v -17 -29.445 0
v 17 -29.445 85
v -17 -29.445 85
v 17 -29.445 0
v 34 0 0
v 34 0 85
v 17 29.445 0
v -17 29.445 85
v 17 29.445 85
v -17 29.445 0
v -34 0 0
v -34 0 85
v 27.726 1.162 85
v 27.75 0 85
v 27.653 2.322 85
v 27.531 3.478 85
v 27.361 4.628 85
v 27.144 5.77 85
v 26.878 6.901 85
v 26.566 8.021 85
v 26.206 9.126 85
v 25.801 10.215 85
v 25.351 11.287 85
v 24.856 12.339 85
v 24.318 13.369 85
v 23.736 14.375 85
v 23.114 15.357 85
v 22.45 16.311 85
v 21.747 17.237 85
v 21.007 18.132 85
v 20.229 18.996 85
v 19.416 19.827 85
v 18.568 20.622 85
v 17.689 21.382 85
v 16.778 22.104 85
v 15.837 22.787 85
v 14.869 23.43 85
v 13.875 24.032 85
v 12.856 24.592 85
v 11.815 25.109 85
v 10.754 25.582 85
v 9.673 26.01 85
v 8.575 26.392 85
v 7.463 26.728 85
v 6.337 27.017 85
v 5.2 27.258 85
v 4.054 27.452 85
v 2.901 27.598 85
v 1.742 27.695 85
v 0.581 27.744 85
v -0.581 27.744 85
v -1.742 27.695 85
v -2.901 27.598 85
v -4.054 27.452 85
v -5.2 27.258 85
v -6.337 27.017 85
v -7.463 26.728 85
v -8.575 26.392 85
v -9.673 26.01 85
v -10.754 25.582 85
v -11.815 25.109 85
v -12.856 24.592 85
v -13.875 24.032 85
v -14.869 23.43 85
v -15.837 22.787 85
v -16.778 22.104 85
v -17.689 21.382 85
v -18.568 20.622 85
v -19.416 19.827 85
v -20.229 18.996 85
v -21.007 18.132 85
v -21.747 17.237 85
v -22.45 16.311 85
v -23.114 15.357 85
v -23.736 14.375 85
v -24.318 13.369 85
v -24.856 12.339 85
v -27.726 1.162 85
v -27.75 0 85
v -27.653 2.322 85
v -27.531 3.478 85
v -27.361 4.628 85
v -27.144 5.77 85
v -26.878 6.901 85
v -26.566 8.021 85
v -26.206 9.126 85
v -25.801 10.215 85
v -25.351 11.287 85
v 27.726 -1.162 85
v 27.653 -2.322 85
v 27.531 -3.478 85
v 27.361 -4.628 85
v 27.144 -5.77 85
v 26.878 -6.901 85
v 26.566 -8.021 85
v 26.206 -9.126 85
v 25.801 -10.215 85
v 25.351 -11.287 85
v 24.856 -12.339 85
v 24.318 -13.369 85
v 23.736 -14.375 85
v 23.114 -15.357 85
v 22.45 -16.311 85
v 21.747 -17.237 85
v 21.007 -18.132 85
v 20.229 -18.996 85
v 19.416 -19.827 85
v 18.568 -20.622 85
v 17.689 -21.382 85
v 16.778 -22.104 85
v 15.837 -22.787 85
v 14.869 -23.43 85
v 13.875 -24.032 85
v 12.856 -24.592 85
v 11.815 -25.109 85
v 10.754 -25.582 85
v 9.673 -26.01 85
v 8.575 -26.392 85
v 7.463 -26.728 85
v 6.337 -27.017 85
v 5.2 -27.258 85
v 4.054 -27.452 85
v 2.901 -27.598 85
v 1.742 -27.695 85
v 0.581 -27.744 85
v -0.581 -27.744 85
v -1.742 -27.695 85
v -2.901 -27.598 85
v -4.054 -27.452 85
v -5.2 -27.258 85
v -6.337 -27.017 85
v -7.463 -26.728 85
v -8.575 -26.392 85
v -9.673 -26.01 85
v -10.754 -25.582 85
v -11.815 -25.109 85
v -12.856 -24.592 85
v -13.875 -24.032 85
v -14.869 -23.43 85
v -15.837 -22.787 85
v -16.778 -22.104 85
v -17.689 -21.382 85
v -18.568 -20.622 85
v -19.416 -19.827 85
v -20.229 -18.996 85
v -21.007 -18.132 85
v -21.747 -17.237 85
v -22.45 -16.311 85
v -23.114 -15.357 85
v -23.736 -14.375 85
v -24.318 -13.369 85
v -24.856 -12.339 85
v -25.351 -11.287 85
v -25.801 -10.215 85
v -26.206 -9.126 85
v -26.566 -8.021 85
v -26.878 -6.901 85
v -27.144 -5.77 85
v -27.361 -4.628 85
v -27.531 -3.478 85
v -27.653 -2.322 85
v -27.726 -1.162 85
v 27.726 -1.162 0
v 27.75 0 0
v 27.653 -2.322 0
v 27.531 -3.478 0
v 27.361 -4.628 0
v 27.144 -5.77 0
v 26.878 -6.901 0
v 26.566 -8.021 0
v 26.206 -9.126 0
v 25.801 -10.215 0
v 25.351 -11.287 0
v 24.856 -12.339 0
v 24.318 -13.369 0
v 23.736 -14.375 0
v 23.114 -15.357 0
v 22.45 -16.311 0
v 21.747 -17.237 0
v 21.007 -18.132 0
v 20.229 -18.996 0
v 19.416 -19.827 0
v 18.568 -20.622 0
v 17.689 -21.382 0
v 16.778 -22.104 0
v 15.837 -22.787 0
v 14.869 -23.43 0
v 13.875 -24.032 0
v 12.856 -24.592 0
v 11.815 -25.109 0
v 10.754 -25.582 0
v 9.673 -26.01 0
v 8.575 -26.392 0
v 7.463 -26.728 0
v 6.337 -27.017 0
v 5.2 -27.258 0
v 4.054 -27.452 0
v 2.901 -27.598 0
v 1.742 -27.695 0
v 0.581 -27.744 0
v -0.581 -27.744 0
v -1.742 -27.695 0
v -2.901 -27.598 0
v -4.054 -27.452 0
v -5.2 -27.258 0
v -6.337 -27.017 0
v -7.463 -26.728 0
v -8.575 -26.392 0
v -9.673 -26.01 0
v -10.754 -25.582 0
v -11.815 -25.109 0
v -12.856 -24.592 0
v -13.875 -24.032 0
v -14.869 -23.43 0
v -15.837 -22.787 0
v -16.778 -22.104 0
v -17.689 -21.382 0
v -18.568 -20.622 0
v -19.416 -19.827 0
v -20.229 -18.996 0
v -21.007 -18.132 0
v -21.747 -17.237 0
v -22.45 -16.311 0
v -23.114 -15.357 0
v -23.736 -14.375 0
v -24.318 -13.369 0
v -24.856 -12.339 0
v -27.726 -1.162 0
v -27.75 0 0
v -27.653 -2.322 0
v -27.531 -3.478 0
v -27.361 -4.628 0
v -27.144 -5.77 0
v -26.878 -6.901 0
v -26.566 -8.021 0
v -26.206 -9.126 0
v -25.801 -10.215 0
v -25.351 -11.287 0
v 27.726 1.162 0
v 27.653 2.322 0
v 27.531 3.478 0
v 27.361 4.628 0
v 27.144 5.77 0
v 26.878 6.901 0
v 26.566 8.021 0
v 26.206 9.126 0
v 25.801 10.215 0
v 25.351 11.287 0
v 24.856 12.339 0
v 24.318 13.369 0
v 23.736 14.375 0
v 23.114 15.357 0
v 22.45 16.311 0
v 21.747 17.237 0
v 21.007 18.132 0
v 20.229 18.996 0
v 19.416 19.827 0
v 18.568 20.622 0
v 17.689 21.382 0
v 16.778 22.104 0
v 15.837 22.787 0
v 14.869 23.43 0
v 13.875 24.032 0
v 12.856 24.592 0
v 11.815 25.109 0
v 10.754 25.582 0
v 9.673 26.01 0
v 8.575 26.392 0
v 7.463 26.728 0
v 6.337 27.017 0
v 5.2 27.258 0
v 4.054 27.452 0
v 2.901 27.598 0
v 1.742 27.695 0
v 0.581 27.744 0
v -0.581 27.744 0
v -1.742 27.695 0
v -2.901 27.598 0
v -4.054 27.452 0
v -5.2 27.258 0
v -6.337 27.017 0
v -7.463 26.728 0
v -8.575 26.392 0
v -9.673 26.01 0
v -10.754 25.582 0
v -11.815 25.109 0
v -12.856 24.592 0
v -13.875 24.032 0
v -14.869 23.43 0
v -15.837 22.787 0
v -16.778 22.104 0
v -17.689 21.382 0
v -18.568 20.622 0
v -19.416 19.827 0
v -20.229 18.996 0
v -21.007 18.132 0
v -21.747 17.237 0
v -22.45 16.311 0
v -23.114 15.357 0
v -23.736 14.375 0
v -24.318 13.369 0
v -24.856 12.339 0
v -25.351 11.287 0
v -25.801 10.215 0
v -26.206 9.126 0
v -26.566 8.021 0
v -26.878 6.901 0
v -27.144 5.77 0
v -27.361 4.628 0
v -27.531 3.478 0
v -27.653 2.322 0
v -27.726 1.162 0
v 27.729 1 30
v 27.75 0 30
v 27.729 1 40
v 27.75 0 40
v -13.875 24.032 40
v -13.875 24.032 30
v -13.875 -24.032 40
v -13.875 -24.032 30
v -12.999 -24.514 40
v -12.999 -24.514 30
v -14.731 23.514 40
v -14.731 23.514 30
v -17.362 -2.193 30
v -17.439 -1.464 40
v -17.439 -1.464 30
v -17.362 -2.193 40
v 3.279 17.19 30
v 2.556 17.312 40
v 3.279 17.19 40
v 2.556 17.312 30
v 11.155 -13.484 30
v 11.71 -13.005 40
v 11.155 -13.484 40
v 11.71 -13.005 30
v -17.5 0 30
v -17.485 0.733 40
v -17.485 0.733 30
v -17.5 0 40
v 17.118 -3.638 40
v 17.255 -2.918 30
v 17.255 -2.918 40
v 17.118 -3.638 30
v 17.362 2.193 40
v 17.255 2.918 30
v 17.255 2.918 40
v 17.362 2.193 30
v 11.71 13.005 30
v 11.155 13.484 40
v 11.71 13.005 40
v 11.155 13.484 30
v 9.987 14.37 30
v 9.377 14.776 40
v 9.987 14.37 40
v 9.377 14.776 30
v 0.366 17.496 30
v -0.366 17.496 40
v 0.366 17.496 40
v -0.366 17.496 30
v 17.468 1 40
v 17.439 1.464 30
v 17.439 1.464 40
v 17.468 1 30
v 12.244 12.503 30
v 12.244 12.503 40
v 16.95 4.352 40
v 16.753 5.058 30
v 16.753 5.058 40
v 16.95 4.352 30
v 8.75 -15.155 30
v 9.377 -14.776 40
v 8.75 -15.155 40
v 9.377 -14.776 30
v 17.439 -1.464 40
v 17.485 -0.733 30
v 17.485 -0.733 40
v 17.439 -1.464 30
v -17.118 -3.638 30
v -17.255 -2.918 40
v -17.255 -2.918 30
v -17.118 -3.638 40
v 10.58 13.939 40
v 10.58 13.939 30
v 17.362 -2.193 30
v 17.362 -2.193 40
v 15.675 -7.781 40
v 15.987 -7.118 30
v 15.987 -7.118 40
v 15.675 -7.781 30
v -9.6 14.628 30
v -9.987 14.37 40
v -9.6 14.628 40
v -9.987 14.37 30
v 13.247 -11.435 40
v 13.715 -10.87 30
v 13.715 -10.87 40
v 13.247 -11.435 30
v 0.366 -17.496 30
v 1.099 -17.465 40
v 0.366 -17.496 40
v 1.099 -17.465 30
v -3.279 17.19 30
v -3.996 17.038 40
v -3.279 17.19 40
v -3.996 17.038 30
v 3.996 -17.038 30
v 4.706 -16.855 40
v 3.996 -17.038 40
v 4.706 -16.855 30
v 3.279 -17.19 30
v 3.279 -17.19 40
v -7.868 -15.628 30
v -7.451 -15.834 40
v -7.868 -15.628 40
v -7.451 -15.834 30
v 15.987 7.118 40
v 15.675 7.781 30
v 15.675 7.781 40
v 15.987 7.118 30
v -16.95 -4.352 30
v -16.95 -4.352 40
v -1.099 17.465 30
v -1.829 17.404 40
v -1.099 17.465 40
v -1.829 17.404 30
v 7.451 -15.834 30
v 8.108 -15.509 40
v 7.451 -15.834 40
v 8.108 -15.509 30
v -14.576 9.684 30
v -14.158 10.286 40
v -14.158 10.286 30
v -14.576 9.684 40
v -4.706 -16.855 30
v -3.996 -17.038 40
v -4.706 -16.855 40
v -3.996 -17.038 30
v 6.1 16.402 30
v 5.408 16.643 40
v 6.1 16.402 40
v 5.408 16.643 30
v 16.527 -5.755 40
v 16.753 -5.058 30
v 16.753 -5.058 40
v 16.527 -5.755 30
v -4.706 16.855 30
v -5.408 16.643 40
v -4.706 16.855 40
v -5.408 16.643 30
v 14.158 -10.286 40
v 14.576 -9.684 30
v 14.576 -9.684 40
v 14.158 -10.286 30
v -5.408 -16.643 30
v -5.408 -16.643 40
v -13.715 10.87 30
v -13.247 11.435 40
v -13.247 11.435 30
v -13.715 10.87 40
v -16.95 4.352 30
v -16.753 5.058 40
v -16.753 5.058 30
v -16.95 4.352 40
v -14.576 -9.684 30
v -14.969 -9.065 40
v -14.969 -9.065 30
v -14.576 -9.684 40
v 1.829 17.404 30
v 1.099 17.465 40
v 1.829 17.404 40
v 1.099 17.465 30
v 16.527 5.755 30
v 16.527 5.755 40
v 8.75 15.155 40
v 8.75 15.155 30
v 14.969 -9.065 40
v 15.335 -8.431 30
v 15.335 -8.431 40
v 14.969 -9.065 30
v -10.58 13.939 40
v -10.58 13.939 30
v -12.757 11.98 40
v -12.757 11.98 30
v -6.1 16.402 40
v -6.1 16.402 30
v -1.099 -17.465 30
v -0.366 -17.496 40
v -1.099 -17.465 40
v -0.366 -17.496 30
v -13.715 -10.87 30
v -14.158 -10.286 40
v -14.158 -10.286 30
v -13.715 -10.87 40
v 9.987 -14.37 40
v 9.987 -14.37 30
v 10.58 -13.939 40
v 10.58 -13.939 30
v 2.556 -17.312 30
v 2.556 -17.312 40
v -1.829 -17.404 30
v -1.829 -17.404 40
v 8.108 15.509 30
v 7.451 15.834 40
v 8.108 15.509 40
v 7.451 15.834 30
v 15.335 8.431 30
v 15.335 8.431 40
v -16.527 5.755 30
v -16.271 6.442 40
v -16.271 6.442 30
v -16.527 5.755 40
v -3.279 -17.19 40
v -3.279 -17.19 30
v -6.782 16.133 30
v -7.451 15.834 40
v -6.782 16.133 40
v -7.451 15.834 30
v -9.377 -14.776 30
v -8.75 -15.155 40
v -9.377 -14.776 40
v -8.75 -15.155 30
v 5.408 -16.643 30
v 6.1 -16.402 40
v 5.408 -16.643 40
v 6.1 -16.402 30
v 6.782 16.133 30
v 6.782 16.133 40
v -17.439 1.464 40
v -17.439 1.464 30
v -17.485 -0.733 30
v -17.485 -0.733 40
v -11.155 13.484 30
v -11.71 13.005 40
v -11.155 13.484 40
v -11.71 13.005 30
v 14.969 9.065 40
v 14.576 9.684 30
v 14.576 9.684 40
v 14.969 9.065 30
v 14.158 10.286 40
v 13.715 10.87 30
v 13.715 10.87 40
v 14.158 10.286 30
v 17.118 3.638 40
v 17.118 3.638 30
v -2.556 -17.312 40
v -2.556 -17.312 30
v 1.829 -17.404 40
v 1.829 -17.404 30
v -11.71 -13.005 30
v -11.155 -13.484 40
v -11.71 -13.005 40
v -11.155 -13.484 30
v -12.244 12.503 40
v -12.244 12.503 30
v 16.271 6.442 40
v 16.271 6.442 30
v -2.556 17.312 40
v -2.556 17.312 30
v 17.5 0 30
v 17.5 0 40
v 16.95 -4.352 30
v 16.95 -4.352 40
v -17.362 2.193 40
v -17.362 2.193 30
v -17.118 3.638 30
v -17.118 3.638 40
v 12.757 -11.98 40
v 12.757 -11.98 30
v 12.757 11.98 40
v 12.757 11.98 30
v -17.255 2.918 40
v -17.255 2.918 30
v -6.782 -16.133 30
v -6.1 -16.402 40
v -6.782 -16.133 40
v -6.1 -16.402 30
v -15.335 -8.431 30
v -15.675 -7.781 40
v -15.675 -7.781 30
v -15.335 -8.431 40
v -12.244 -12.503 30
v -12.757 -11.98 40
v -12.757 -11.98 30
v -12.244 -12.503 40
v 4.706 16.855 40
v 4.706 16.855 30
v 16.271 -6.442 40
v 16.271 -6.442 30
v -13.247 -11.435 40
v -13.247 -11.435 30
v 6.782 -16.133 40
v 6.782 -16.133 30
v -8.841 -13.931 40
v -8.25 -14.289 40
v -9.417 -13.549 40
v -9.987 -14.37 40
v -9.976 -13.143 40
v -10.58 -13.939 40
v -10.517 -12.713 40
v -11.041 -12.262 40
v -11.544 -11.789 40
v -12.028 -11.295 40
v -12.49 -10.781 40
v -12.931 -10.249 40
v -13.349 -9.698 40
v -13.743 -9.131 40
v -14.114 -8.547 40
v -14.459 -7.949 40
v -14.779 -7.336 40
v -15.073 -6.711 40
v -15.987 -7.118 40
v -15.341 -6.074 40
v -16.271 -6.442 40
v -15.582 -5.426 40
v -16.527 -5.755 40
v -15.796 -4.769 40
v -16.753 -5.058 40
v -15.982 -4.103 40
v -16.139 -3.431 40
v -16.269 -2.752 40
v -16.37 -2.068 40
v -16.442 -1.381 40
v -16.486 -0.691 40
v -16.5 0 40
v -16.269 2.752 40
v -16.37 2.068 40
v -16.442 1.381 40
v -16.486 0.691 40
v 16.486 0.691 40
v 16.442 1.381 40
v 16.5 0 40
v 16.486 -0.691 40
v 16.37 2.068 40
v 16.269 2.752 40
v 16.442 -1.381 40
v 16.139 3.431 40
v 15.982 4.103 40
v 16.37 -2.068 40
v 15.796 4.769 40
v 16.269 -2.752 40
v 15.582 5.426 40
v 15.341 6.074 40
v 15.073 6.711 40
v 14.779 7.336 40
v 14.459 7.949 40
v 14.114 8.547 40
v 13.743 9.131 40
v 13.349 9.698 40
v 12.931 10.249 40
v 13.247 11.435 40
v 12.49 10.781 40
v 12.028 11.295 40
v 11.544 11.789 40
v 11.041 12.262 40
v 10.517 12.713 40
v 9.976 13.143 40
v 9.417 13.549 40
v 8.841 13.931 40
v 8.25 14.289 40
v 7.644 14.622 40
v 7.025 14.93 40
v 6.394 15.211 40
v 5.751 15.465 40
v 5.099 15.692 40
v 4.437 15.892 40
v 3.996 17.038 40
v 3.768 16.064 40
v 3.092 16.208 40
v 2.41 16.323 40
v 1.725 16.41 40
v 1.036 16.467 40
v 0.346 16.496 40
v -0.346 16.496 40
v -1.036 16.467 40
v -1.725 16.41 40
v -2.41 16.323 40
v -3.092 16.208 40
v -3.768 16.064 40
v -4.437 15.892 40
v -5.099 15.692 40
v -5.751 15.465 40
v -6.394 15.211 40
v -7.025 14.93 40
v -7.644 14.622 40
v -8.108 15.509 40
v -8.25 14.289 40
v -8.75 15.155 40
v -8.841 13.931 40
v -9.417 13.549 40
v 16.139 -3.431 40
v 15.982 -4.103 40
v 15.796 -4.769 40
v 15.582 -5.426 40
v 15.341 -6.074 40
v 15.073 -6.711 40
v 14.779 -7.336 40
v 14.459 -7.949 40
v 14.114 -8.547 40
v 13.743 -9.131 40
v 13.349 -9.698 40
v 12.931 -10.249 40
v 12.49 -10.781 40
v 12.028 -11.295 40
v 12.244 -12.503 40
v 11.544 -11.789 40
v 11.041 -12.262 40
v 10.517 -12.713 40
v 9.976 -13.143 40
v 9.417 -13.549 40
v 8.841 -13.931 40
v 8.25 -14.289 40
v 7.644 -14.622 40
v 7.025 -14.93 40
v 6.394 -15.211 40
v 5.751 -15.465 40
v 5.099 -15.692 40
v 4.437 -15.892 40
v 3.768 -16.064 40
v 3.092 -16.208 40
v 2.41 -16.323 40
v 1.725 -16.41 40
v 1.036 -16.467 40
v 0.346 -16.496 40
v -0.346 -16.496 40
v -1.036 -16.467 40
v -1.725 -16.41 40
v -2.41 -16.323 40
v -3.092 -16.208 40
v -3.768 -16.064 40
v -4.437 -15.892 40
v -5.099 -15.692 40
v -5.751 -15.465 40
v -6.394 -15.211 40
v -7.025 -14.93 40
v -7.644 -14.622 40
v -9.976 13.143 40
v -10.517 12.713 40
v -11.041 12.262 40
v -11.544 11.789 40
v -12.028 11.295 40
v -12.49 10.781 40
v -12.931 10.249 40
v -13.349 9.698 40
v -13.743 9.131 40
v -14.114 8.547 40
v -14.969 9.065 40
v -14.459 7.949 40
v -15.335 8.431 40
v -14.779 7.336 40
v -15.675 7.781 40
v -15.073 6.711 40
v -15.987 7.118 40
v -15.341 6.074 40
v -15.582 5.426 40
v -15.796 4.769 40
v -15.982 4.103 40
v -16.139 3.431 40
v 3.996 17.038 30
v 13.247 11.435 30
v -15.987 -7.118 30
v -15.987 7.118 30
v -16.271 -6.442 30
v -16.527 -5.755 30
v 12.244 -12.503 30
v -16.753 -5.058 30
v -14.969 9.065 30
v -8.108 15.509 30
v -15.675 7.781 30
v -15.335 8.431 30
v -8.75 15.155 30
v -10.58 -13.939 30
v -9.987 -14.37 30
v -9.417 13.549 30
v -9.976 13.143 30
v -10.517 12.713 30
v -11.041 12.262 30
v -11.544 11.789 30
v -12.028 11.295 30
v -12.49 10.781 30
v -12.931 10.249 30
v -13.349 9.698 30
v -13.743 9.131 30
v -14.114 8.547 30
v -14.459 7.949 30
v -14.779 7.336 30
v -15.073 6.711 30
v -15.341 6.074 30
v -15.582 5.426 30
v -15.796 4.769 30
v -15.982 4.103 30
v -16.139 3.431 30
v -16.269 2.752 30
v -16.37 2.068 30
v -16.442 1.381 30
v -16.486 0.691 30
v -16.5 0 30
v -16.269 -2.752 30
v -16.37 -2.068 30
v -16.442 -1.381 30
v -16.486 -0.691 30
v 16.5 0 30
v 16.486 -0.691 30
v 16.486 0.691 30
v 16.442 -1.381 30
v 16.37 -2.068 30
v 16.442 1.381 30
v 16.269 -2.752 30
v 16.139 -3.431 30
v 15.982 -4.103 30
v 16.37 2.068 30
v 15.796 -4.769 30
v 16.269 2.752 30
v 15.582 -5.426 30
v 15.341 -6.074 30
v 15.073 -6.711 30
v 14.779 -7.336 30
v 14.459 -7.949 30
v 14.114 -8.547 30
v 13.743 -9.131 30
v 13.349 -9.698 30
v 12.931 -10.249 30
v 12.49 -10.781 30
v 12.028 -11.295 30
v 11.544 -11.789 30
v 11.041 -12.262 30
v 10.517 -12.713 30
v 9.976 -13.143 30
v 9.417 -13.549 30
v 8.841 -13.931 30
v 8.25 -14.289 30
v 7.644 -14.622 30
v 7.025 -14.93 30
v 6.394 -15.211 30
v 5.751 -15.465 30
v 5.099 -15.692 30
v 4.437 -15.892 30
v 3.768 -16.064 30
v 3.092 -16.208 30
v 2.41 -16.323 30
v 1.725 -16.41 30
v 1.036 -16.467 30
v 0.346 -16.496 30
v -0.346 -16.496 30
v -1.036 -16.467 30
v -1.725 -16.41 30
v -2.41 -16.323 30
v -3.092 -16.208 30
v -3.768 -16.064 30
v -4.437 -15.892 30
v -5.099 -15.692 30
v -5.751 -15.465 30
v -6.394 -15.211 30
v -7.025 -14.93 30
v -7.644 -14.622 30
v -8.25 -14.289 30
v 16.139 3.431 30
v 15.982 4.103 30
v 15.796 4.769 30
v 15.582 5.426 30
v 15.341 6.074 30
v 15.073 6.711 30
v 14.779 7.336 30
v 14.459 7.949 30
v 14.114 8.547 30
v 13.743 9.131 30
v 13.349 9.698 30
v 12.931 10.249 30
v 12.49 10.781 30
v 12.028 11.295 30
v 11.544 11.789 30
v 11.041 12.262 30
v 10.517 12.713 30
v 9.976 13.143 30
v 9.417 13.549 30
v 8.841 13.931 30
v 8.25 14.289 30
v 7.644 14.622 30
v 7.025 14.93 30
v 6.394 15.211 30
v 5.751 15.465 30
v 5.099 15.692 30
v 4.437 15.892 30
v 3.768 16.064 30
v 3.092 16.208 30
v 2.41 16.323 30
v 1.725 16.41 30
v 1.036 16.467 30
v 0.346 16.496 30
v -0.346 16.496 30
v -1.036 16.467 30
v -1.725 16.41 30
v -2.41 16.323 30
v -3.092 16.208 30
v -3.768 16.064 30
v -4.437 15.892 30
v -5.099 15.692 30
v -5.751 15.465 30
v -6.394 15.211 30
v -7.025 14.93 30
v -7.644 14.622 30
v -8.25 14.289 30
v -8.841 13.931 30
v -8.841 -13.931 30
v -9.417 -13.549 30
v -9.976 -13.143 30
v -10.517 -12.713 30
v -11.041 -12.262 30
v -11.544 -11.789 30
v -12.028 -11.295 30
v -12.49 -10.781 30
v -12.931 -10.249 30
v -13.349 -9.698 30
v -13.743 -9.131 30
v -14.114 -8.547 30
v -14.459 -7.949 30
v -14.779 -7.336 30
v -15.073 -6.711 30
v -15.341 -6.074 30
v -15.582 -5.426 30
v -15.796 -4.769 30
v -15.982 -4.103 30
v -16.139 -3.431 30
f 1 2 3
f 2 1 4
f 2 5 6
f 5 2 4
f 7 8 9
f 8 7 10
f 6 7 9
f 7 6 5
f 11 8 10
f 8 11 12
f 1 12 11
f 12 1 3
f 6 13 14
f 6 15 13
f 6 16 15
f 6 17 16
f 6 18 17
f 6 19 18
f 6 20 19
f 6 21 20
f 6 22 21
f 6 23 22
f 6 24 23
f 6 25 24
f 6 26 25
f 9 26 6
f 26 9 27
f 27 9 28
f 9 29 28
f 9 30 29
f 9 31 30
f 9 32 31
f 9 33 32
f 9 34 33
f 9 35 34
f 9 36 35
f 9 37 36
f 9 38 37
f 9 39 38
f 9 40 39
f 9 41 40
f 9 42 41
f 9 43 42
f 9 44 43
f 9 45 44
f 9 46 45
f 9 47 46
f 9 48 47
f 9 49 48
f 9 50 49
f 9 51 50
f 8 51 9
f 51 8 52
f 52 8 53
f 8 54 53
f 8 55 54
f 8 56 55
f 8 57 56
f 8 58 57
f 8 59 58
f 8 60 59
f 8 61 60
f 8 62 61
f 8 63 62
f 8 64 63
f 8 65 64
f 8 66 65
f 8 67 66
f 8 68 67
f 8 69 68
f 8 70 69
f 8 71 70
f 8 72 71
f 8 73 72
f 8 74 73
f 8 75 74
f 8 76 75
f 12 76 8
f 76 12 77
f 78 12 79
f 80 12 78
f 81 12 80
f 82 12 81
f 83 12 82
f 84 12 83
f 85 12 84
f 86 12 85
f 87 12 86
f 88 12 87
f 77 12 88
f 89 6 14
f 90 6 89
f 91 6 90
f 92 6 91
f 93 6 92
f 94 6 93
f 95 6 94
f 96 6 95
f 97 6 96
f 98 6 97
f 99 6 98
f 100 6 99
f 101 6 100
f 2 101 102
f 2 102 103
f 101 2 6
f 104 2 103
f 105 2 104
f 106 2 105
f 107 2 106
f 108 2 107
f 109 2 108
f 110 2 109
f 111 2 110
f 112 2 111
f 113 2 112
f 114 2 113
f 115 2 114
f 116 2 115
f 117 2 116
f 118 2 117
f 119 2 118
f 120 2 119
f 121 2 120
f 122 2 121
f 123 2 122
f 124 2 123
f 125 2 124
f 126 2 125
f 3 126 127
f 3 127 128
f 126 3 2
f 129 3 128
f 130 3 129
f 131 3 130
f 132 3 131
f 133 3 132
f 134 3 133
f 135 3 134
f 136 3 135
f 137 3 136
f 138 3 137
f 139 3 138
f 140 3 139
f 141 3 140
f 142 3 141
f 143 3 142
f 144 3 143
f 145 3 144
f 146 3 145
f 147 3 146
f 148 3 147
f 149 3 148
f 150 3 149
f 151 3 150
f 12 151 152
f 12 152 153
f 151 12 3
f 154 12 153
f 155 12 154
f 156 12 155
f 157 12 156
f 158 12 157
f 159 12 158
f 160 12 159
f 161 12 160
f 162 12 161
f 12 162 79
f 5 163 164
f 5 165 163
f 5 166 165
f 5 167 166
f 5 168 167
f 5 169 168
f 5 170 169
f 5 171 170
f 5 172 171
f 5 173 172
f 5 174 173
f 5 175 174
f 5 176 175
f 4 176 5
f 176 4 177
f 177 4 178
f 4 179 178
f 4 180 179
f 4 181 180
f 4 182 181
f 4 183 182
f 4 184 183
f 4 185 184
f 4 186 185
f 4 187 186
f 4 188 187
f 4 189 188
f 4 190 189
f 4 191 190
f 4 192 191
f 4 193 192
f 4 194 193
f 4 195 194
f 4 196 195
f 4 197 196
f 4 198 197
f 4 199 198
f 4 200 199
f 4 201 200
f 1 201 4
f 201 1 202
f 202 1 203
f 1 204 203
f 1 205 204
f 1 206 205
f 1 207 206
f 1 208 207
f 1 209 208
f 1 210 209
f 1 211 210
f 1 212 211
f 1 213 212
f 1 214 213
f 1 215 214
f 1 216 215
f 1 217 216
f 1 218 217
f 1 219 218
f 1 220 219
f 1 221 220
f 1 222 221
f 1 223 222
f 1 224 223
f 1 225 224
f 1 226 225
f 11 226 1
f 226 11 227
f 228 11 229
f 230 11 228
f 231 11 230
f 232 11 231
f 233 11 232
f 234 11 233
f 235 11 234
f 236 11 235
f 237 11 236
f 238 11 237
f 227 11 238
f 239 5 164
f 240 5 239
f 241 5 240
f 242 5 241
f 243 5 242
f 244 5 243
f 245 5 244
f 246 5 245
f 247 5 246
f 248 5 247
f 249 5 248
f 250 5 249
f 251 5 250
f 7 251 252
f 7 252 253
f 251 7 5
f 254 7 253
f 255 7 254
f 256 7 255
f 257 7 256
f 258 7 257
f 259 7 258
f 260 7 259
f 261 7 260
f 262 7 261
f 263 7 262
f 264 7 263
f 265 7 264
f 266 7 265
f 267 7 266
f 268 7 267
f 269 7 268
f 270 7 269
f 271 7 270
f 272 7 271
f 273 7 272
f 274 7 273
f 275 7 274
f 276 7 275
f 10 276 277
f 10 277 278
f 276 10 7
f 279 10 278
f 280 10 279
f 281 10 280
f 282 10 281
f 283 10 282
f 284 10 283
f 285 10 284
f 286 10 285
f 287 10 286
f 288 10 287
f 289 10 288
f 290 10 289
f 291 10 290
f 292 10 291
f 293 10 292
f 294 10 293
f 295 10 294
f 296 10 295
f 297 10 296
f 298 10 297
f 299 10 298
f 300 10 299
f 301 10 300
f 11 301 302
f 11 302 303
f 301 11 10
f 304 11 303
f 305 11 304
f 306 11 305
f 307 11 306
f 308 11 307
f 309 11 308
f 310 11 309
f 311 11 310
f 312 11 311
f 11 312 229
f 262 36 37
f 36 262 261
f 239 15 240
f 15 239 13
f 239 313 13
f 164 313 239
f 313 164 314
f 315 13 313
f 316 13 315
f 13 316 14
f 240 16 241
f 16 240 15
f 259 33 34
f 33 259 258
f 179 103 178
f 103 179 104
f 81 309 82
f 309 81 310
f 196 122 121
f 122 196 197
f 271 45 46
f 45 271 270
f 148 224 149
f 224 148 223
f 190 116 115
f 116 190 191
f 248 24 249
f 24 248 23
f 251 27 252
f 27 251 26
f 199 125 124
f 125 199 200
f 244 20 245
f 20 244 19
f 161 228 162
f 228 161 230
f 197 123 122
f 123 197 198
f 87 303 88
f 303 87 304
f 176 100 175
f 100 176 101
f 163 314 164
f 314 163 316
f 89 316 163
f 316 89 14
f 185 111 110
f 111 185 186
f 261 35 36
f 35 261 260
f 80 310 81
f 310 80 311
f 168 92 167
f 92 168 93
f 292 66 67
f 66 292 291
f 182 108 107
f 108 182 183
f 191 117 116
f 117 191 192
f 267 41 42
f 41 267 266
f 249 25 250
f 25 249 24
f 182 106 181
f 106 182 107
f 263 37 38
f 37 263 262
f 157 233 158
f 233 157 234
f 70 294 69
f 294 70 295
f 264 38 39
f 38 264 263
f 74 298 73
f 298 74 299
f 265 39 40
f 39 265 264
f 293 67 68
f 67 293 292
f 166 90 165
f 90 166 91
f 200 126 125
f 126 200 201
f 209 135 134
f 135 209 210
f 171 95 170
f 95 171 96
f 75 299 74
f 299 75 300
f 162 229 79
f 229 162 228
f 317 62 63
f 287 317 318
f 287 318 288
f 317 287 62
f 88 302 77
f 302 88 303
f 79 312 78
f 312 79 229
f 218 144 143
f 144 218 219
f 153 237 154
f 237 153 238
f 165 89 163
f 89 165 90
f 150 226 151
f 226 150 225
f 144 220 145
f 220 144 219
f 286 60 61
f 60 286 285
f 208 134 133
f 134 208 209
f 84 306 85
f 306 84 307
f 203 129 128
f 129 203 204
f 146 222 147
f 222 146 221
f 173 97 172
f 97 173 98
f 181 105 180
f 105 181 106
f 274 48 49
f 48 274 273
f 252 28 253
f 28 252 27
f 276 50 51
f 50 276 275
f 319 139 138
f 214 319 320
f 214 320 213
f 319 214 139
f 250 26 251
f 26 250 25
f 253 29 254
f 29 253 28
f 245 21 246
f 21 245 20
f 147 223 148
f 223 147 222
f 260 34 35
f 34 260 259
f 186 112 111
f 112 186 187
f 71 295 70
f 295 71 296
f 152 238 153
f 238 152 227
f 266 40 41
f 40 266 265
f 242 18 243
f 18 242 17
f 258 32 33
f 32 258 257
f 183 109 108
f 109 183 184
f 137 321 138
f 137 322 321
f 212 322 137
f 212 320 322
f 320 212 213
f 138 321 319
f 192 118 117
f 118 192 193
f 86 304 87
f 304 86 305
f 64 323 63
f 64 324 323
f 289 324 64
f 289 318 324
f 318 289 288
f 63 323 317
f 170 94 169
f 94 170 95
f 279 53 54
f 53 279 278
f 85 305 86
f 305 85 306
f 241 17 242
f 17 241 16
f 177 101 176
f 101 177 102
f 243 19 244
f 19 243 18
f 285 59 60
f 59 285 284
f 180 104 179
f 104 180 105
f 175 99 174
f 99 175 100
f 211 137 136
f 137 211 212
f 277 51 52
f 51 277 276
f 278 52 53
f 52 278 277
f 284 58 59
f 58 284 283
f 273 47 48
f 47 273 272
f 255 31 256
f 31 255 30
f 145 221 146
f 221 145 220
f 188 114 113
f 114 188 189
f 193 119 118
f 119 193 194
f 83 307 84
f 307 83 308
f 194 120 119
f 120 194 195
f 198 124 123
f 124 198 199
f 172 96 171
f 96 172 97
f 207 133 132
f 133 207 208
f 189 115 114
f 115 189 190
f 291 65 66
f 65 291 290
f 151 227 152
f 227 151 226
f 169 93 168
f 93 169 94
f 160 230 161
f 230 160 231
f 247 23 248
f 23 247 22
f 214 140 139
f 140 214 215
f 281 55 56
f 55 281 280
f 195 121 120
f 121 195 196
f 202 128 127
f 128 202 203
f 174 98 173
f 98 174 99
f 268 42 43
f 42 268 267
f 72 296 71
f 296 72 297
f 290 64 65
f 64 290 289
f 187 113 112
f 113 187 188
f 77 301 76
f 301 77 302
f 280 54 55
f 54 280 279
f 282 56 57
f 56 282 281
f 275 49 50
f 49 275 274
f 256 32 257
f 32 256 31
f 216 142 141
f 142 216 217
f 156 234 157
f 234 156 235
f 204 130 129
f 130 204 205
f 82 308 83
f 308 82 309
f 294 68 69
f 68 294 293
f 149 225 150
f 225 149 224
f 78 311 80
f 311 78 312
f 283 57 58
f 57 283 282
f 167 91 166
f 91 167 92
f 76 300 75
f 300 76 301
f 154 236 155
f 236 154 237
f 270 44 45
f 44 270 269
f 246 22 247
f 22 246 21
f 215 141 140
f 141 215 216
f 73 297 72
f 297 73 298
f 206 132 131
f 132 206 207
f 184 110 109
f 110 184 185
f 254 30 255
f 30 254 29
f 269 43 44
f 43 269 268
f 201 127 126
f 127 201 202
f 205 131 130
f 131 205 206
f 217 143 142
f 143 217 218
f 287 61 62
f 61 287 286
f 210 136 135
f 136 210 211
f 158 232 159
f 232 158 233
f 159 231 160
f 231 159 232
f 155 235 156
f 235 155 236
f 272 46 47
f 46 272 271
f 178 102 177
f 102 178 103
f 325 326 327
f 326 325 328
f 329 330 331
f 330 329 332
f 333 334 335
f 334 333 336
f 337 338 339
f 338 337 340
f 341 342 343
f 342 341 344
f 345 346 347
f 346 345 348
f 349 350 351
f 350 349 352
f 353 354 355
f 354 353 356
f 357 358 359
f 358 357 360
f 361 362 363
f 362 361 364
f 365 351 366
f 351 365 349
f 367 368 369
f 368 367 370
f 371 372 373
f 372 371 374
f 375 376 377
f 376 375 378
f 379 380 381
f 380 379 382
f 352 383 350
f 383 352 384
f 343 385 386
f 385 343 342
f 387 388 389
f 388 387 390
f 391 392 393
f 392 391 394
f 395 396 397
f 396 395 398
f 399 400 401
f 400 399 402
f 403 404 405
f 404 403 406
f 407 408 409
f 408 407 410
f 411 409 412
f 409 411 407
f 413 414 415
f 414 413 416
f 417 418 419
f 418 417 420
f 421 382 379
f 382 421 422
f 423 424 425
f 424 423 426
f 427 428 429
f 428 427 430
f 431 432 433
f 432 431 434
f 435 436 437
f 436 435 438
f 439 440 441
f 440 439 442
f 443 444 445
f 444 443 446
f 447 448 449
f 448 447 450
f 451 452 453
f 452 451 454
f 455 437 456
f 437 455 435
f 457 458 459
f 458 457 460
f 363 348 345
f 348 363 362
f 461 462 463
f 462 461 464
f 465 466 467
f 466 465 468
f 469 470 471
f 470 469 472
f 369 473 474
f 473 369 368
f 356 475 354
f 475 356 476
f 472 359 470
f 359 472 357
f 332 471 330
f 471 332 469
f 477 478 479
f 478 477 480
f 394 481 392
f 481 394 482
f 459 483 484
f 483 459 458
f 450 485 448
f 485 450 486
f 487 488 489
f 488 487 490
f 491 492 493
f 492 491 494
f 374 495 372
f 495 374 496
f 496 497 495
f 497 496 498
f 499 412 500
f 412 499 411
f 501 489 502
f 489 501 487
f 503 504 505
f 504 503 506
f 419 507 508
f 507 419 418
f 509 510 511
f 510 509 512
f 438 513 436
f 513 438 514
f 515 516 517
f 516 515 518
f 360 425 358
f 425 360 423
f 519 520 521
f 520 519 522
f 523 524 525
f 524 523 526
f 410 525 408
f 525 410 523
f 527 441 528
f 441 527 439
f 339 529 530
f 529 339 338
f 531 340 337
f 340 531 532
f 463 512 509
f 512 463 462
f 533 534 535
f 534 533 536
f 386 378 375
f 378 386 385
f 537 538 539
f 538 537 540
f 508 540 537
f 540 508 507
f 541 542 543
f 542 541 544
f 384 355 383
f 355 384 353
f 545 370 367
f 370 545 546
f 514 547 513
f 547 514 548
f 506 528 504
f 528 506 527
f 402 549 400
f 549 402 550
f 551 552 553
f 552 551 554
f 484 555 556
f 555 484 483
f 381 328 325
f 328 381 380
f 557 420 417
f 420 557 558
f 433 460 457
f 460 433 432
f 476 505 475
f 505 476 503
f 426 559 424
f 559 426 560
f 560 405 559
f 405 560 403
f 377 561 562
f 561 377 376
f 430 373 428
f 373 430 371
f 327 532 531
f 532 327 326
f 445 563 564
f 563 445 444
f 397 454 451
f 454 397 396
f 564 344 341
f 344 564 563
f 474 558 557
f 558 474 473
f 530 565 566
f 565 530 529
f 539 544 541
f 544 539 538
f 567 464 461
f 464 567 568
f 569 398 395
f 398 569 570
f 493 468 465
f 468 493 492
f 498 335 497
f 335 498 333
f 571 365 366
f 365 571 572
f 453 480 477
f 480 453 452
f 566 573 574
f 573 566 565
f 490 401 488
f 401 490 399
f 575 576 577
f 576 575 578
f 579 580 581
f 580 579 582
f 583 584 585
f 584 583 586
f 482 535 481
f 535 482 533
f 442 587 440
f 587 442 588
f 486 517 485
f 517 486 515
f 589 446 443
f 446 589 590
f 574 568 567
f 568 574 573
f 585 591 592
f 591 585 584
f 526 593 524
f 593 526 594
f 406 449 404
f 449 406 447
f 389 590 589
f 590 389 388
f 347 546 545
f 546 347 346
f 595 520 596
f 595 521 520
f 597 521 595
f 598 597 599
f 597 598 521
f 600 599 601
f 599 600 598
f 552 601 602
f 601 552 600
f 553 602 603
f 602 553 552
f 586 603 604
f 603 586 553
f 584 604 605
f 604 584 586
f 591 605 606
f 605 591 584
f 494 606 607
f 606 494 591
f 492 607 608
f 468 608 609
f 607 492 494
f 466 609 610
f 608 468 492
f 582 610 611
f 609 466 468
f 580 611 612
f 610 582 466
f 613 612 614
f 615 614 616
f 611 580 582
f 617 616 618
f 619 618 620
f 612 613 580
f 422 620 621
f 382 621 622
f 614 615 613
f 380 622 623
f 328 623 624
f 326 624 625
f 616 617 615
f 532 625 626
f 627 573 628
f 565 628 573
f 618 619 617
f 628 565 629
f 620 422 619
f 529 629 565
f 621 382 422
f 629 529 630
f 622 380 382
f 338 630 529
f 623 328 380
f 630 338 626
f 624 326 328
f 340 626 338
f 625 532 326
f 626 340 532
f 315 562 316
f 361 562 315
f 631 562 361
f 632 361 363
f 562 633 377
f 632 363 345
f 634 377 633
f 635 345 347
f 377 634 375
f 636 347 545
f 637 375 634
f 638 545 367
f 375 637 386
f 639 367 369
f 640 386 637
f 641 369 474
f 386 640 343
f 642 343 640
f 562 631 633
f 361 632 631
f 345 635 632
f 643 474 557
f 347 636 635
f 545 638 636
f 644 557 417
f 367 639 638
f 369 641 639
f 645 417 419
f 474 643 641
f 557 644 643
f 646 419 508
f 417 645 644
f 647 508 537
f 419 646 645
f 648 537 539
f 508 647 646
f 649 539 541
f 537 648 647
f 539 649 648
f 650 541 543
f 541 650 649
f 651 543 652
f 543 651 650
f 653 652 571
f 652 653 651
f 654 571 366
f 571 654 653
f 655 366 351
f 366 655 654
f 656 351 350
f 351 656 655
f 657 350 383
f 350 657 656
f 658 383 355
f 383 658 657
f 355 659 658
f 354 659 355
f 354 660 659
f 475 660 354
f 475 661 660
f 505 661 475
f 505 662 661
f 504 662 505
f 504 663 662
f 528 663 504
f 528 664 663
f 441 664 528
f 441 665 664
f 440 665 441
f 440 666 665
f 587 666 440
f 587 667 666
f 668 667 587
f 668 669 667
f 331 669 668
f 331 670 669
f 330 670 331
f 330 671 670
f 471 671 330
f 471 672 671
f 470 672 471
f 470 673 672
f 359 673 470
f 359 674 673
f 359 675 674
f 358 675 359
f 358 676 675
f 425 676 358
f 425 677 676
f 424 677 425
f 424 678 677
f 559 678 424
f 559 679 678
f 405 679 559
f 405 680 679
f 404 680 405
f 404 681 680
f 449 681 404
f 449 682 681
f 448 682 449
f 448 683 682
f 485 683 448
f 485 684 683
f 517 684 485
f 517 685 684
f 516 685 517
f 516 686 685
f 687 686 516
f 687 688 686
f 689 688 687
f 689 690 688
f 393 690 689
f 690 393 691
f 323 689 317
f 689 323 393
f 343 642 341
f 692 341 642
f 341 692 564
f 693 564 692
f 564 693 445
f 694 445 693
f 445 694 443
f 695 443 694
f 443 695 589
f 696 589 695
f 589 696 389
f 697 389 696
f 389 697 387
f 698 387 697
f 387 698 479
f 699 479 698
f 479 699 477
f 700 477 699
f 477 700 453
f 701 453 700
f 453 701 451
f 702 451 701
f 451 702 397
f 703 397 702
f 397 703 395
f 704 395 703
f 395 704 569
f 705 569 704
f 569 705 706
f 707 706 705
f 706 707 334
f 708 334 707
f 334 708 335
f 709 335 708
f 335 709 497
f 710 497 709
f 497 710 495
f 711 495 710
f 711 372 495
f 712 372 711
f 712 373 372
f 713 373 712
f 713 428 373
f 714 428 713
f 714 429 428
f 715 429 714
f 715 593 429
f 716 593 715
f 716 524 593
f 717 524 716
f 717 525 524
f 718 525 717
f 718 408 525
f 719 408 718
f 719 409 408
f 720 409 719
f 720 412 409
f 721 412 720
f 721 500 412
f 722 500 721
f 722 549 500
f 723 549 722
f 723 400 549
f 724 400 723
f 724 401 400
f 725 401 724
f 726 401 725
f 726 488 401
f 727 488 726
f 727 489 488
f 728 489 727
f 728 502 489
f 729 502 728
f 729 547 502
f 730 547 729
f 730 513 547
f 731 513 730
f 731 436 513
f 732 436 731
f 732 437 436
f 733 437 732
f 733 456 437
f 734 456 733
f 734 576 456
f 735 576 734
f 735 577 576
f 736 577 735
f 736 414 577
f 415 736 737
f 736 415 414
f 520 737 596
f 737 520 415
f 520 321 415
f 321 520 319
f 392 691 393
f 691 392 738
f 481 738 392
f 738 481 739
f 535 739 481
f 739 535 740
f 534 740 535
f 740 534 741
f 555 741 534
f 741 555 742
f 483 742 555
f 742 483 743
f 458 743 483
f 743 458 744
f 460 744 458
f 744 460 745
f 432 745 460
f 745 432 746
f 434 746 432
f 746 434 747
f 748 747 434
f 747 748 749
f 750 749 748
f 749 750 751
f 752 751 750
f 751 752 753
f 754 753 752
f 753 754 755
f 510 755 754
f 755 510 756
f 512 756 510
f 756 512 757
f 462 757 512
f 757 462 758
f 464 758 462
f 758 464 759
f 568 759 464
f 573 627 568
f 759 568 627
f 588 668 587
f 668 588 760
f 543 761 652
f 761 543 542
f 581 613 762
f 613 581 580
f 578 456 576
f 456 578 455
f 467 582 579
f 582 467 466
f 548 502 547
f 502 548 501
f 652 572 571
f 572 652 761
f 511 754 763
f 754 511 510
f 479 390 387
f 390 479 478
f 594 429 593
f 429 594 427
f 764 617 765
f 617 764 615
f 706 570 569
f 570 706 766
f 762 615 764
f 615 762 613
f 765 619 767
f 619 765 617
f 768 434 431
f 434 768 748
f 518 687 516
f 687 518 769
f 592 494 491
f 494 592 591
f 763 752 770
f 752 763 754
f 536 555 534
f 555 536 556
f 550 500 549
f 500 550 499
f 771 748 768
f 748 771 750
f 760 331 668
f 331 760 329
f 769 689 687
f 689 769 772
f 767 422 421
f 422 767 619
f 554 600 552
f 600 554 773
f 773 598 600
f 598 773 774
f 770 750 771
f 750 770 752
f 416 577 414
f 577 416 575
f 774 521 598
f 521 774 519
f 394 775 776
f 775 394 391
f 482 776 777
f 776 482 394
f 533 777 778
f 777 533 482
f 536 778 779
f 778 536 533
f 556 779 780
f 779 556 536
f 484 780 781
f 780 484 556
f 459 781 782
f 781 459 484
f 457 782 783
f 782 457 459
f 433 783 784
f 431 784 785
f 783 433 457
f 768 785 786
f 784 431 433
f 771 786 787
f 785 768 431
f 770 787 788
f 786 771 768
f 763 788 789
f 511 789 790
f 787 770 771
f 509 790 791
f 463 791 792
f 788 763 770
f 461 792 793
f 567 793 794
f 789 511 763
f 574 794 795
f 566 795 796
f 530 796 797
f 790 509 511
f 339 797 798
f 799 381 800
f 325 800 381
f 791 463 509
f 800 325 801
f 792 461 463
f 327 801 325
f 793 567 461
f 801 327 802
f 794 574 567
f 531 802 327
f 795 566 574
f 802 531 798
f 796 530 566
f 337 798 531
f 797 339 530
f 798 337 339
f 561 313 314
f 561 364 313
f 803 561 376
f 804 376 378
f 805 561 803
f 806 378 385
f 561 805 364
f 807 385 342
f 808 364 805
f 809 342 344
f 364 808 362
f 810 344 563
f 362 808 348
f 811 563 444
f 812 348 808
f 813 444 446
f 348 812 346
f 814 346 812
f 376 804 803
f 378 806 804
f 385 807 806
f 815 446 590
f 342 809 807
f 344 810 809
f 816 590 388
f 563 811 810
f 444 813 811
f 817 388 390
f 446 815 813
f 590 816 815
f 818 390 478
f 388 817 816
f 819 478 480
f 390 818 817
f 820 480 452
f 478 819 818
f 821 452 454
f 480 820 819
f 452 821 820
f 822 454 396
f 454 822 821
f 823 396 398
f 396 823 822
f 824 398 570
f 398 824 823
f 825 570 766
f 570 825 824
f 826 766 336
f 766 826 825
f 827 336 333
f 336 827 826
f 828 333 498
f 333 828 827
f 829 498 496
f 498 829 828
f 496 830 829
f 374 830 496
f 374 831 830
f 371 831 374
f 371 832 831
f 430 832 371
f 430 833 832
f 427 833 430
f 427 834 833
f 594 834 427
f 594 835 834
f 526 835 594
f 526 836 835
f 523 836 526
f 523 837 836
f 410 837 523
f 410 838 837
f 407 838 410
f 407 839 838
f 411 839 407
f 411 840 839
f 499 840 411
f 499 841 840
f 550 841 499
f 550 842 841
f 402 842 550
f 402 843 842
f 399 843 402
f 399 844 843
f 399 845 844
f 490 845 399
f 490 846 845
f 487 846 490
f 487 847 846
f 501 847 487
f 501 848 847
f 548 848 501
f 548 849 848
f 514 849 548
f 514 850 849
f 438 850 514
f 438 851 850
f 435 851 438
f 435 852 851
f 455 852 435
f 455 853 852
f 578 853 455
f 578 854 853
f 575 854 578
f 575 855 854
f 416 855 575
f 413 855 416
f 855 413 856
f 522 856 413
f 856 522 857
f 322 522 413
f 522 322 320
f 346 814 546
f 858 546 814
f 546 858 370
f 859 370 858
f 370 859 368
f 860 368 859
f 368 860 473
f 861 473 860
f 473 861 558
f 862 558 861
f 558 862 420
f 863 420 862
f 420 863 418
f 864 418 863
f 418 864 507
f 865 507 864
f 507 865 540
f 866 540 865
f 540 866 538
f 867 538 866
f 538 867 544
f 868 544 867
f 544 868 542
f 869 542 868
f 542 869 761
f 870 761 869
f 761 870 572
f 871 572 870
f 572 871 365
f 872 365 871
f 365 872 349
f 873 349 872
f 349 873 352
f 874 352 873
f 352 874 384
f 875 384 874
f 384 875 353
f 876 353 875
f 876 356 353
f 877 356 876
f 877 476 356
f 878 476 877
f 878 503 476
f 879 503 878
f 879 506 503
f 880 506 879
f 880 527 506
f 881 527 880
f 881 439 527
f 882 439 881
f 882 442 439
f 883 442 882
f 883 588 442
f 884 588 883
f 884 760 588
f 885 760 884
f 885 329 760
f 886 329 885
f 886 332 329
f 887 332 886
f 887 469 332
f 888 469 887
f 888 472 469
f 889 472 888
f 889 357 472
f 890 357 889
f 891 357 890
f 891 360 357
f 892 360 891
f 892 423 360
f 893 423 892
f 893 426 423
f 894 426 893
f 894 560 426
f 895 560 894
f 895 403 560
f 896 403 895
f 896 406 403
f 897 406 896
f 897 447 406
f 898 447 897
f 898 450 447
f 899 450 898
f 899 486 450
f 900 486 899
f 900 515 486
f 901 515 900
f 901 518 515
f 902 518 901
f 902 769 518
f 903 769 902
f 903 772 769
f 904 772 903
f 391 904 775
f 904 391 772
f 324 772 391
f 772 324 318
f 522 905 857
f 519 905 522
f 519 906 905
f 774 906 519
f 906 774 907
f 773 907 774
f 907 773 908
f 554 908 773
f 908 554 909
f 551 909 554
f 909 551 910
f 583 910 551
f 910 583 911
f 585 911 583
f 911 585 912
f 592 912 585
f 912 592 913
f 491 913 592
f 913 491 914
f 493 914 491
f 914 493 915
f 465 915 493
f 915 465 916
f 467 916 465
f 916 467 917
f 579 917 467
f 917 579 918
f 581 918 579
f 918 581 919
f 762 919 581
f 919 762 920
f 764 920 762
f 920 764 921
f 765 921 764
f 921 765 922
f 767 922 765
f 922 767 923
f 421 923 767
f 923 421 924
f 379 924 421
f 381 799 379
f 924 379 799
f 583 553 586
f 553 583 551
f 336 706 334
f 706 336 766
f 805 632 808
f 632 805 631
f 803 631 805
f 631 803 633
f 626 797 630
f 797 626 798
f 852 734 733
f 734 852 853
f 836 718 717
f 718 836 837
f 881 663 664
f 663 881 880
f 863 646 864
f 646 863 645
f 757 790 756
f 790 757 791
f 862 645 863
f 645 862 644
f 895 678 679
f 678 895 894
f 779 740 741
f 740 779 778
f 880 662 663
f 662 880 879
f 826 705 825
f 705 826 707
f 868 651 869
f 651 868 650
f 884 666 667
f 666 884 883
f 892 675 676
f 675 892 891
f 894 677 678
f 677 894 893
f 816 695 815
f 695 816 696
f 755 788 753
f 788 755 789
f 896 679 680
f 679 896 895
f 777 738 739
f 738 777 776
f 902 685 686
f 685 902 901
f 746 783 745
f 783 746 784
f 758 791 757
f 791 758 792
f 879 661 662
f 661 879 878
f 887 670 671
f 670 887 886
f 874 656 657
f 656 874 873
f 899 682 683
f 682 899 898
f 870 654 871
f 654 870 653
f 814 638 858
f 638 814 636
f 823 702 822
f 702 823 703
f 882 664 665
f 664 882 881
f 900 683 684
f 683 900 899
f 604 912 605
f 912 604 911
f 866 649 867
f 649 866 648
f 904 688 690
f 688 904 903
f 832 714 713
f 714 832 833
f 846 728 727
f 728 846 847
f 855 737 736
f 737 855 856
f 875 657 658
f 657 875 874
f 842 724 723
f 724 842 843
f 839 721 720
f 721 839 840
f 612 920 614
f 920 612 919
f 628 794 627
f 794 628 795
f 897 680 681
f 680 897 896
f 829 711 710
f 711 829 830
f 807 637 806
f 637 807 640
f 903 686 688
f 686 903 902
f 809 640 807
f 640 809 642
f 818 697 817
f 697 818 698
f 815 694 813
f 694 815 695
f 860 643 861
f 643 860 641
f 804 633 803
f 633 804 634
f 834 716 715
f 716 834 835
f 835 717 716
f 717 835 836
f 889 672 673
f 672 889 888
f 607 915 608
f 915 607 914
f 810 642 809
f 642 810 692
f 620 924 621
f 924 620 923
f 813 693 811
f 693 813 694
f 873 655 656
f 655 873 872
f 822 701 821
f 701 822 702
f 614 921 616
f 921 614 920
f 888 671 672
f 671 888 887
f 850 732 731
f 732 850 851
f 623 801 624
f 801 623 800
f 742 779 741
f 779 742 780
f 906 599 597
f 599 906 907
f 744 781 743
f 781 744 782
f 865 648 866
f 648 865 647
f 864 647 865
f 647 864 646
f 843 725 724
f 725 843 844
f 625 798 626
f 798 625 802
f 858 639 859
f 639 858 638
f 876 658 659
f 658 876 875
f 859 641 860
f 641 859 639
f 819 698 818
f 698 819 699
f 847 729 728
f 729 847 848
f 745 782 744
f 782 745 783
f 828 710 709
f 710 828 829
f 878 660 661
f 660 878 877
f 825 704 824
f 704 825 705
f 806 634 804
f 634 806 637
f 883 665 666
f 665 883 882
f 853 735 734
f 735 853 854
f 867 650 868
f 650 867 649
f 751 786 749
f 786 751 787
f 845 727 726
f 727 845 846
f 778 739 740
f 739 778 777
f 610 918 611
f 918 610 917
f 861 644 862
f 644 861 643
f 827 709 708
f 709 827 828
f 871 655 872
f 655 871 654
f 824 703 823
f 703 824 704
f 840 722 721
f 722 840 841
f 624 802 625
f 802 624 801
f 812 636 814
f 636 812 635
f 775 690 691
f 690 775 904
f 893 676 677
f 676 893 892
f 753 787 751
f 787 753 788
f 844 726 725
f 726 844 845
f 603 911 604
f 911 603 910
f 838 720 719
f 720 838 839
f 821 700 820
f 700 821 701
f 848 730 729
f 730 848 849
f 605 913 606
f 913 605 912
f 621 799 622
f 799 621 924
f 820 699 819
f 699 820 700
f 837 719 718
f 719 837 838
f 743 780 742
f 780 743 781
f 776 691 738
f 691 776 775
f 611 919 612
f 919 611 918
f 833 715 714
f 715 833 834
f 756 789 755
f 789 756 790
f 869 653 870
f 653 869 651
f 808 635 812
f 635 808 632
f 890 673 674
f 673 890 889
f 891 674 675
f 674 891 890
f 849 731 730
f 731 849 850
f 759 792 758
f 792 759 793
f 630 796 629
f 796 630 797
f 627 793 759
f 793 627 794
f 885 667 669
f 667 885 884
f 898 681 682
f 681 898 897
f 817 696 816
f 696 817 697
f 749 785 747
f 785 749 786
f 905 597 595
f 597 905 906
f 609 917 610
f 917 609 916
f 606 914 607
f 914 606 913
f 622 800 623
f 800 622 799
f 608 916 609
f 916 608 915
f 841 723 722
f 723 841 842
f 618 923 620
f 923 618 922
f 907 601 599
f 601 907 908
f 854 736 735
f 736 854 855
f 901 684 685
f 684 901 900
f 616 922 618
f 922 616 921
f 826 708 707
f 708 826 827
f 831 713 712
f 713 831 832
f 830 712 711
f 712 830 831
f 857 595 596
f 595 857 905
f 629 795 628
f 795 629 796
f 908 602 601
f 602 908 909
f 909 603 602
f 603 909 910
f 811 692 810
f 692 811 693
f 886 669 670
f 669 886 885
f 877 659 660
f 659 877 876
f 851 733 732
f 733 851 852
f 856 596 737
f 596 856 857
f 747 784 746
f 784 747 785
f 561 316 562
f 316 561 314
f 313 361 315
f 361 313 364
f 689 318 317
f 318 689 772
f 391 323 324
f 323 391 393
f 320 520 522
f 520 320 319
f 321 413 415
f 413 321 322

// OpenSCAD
inner_diameter = 55.5;
outer_diameter = 68;
difference(){
    cylinder(d=outer_diameter, h=85, $fn=6);
    cylinder(d=inner_diameter, h=85, $fn=150);
}

battery_holder_diameter = 33;
battery_holder_thickness = 1;
battery_holder_height=10;
battery_holder_offset=30;

gap = (inner_diameter-battery_holder_diameter)/2;

module rotate_about_pt(z, y, pt) {
    translate(pt)
        rotate([0, y, z]) // CHANGE HERE
            translate(-pt)
                children();   
}

module connector(){
    linear_extrude(height = battery_holder_height) {
        # translate([battery_holder_diameter/2,0,0])
        polygon(points = [ [0, 0],
                        [gap, 0],
                        [gap, battery_holder_thickness],
                        [0, battery_holder_thickness]]
        );
    }
}

translate([0,0,battery_holder_offset]){
    difference(){
        cylinder(d=battery_holder_diameter+(2*battery_holder_thickness), h=battery_holder_height, $fn=150);
        cylinder(d=battery_holder_diameter, h=battery_holder_height, $fn=150);
    }
    connector();
    rotate_about_pt(120,0,[0,0,0])
        connector();
    rotate_about_pt(240,0,[0,0,0])
        connector();
}
